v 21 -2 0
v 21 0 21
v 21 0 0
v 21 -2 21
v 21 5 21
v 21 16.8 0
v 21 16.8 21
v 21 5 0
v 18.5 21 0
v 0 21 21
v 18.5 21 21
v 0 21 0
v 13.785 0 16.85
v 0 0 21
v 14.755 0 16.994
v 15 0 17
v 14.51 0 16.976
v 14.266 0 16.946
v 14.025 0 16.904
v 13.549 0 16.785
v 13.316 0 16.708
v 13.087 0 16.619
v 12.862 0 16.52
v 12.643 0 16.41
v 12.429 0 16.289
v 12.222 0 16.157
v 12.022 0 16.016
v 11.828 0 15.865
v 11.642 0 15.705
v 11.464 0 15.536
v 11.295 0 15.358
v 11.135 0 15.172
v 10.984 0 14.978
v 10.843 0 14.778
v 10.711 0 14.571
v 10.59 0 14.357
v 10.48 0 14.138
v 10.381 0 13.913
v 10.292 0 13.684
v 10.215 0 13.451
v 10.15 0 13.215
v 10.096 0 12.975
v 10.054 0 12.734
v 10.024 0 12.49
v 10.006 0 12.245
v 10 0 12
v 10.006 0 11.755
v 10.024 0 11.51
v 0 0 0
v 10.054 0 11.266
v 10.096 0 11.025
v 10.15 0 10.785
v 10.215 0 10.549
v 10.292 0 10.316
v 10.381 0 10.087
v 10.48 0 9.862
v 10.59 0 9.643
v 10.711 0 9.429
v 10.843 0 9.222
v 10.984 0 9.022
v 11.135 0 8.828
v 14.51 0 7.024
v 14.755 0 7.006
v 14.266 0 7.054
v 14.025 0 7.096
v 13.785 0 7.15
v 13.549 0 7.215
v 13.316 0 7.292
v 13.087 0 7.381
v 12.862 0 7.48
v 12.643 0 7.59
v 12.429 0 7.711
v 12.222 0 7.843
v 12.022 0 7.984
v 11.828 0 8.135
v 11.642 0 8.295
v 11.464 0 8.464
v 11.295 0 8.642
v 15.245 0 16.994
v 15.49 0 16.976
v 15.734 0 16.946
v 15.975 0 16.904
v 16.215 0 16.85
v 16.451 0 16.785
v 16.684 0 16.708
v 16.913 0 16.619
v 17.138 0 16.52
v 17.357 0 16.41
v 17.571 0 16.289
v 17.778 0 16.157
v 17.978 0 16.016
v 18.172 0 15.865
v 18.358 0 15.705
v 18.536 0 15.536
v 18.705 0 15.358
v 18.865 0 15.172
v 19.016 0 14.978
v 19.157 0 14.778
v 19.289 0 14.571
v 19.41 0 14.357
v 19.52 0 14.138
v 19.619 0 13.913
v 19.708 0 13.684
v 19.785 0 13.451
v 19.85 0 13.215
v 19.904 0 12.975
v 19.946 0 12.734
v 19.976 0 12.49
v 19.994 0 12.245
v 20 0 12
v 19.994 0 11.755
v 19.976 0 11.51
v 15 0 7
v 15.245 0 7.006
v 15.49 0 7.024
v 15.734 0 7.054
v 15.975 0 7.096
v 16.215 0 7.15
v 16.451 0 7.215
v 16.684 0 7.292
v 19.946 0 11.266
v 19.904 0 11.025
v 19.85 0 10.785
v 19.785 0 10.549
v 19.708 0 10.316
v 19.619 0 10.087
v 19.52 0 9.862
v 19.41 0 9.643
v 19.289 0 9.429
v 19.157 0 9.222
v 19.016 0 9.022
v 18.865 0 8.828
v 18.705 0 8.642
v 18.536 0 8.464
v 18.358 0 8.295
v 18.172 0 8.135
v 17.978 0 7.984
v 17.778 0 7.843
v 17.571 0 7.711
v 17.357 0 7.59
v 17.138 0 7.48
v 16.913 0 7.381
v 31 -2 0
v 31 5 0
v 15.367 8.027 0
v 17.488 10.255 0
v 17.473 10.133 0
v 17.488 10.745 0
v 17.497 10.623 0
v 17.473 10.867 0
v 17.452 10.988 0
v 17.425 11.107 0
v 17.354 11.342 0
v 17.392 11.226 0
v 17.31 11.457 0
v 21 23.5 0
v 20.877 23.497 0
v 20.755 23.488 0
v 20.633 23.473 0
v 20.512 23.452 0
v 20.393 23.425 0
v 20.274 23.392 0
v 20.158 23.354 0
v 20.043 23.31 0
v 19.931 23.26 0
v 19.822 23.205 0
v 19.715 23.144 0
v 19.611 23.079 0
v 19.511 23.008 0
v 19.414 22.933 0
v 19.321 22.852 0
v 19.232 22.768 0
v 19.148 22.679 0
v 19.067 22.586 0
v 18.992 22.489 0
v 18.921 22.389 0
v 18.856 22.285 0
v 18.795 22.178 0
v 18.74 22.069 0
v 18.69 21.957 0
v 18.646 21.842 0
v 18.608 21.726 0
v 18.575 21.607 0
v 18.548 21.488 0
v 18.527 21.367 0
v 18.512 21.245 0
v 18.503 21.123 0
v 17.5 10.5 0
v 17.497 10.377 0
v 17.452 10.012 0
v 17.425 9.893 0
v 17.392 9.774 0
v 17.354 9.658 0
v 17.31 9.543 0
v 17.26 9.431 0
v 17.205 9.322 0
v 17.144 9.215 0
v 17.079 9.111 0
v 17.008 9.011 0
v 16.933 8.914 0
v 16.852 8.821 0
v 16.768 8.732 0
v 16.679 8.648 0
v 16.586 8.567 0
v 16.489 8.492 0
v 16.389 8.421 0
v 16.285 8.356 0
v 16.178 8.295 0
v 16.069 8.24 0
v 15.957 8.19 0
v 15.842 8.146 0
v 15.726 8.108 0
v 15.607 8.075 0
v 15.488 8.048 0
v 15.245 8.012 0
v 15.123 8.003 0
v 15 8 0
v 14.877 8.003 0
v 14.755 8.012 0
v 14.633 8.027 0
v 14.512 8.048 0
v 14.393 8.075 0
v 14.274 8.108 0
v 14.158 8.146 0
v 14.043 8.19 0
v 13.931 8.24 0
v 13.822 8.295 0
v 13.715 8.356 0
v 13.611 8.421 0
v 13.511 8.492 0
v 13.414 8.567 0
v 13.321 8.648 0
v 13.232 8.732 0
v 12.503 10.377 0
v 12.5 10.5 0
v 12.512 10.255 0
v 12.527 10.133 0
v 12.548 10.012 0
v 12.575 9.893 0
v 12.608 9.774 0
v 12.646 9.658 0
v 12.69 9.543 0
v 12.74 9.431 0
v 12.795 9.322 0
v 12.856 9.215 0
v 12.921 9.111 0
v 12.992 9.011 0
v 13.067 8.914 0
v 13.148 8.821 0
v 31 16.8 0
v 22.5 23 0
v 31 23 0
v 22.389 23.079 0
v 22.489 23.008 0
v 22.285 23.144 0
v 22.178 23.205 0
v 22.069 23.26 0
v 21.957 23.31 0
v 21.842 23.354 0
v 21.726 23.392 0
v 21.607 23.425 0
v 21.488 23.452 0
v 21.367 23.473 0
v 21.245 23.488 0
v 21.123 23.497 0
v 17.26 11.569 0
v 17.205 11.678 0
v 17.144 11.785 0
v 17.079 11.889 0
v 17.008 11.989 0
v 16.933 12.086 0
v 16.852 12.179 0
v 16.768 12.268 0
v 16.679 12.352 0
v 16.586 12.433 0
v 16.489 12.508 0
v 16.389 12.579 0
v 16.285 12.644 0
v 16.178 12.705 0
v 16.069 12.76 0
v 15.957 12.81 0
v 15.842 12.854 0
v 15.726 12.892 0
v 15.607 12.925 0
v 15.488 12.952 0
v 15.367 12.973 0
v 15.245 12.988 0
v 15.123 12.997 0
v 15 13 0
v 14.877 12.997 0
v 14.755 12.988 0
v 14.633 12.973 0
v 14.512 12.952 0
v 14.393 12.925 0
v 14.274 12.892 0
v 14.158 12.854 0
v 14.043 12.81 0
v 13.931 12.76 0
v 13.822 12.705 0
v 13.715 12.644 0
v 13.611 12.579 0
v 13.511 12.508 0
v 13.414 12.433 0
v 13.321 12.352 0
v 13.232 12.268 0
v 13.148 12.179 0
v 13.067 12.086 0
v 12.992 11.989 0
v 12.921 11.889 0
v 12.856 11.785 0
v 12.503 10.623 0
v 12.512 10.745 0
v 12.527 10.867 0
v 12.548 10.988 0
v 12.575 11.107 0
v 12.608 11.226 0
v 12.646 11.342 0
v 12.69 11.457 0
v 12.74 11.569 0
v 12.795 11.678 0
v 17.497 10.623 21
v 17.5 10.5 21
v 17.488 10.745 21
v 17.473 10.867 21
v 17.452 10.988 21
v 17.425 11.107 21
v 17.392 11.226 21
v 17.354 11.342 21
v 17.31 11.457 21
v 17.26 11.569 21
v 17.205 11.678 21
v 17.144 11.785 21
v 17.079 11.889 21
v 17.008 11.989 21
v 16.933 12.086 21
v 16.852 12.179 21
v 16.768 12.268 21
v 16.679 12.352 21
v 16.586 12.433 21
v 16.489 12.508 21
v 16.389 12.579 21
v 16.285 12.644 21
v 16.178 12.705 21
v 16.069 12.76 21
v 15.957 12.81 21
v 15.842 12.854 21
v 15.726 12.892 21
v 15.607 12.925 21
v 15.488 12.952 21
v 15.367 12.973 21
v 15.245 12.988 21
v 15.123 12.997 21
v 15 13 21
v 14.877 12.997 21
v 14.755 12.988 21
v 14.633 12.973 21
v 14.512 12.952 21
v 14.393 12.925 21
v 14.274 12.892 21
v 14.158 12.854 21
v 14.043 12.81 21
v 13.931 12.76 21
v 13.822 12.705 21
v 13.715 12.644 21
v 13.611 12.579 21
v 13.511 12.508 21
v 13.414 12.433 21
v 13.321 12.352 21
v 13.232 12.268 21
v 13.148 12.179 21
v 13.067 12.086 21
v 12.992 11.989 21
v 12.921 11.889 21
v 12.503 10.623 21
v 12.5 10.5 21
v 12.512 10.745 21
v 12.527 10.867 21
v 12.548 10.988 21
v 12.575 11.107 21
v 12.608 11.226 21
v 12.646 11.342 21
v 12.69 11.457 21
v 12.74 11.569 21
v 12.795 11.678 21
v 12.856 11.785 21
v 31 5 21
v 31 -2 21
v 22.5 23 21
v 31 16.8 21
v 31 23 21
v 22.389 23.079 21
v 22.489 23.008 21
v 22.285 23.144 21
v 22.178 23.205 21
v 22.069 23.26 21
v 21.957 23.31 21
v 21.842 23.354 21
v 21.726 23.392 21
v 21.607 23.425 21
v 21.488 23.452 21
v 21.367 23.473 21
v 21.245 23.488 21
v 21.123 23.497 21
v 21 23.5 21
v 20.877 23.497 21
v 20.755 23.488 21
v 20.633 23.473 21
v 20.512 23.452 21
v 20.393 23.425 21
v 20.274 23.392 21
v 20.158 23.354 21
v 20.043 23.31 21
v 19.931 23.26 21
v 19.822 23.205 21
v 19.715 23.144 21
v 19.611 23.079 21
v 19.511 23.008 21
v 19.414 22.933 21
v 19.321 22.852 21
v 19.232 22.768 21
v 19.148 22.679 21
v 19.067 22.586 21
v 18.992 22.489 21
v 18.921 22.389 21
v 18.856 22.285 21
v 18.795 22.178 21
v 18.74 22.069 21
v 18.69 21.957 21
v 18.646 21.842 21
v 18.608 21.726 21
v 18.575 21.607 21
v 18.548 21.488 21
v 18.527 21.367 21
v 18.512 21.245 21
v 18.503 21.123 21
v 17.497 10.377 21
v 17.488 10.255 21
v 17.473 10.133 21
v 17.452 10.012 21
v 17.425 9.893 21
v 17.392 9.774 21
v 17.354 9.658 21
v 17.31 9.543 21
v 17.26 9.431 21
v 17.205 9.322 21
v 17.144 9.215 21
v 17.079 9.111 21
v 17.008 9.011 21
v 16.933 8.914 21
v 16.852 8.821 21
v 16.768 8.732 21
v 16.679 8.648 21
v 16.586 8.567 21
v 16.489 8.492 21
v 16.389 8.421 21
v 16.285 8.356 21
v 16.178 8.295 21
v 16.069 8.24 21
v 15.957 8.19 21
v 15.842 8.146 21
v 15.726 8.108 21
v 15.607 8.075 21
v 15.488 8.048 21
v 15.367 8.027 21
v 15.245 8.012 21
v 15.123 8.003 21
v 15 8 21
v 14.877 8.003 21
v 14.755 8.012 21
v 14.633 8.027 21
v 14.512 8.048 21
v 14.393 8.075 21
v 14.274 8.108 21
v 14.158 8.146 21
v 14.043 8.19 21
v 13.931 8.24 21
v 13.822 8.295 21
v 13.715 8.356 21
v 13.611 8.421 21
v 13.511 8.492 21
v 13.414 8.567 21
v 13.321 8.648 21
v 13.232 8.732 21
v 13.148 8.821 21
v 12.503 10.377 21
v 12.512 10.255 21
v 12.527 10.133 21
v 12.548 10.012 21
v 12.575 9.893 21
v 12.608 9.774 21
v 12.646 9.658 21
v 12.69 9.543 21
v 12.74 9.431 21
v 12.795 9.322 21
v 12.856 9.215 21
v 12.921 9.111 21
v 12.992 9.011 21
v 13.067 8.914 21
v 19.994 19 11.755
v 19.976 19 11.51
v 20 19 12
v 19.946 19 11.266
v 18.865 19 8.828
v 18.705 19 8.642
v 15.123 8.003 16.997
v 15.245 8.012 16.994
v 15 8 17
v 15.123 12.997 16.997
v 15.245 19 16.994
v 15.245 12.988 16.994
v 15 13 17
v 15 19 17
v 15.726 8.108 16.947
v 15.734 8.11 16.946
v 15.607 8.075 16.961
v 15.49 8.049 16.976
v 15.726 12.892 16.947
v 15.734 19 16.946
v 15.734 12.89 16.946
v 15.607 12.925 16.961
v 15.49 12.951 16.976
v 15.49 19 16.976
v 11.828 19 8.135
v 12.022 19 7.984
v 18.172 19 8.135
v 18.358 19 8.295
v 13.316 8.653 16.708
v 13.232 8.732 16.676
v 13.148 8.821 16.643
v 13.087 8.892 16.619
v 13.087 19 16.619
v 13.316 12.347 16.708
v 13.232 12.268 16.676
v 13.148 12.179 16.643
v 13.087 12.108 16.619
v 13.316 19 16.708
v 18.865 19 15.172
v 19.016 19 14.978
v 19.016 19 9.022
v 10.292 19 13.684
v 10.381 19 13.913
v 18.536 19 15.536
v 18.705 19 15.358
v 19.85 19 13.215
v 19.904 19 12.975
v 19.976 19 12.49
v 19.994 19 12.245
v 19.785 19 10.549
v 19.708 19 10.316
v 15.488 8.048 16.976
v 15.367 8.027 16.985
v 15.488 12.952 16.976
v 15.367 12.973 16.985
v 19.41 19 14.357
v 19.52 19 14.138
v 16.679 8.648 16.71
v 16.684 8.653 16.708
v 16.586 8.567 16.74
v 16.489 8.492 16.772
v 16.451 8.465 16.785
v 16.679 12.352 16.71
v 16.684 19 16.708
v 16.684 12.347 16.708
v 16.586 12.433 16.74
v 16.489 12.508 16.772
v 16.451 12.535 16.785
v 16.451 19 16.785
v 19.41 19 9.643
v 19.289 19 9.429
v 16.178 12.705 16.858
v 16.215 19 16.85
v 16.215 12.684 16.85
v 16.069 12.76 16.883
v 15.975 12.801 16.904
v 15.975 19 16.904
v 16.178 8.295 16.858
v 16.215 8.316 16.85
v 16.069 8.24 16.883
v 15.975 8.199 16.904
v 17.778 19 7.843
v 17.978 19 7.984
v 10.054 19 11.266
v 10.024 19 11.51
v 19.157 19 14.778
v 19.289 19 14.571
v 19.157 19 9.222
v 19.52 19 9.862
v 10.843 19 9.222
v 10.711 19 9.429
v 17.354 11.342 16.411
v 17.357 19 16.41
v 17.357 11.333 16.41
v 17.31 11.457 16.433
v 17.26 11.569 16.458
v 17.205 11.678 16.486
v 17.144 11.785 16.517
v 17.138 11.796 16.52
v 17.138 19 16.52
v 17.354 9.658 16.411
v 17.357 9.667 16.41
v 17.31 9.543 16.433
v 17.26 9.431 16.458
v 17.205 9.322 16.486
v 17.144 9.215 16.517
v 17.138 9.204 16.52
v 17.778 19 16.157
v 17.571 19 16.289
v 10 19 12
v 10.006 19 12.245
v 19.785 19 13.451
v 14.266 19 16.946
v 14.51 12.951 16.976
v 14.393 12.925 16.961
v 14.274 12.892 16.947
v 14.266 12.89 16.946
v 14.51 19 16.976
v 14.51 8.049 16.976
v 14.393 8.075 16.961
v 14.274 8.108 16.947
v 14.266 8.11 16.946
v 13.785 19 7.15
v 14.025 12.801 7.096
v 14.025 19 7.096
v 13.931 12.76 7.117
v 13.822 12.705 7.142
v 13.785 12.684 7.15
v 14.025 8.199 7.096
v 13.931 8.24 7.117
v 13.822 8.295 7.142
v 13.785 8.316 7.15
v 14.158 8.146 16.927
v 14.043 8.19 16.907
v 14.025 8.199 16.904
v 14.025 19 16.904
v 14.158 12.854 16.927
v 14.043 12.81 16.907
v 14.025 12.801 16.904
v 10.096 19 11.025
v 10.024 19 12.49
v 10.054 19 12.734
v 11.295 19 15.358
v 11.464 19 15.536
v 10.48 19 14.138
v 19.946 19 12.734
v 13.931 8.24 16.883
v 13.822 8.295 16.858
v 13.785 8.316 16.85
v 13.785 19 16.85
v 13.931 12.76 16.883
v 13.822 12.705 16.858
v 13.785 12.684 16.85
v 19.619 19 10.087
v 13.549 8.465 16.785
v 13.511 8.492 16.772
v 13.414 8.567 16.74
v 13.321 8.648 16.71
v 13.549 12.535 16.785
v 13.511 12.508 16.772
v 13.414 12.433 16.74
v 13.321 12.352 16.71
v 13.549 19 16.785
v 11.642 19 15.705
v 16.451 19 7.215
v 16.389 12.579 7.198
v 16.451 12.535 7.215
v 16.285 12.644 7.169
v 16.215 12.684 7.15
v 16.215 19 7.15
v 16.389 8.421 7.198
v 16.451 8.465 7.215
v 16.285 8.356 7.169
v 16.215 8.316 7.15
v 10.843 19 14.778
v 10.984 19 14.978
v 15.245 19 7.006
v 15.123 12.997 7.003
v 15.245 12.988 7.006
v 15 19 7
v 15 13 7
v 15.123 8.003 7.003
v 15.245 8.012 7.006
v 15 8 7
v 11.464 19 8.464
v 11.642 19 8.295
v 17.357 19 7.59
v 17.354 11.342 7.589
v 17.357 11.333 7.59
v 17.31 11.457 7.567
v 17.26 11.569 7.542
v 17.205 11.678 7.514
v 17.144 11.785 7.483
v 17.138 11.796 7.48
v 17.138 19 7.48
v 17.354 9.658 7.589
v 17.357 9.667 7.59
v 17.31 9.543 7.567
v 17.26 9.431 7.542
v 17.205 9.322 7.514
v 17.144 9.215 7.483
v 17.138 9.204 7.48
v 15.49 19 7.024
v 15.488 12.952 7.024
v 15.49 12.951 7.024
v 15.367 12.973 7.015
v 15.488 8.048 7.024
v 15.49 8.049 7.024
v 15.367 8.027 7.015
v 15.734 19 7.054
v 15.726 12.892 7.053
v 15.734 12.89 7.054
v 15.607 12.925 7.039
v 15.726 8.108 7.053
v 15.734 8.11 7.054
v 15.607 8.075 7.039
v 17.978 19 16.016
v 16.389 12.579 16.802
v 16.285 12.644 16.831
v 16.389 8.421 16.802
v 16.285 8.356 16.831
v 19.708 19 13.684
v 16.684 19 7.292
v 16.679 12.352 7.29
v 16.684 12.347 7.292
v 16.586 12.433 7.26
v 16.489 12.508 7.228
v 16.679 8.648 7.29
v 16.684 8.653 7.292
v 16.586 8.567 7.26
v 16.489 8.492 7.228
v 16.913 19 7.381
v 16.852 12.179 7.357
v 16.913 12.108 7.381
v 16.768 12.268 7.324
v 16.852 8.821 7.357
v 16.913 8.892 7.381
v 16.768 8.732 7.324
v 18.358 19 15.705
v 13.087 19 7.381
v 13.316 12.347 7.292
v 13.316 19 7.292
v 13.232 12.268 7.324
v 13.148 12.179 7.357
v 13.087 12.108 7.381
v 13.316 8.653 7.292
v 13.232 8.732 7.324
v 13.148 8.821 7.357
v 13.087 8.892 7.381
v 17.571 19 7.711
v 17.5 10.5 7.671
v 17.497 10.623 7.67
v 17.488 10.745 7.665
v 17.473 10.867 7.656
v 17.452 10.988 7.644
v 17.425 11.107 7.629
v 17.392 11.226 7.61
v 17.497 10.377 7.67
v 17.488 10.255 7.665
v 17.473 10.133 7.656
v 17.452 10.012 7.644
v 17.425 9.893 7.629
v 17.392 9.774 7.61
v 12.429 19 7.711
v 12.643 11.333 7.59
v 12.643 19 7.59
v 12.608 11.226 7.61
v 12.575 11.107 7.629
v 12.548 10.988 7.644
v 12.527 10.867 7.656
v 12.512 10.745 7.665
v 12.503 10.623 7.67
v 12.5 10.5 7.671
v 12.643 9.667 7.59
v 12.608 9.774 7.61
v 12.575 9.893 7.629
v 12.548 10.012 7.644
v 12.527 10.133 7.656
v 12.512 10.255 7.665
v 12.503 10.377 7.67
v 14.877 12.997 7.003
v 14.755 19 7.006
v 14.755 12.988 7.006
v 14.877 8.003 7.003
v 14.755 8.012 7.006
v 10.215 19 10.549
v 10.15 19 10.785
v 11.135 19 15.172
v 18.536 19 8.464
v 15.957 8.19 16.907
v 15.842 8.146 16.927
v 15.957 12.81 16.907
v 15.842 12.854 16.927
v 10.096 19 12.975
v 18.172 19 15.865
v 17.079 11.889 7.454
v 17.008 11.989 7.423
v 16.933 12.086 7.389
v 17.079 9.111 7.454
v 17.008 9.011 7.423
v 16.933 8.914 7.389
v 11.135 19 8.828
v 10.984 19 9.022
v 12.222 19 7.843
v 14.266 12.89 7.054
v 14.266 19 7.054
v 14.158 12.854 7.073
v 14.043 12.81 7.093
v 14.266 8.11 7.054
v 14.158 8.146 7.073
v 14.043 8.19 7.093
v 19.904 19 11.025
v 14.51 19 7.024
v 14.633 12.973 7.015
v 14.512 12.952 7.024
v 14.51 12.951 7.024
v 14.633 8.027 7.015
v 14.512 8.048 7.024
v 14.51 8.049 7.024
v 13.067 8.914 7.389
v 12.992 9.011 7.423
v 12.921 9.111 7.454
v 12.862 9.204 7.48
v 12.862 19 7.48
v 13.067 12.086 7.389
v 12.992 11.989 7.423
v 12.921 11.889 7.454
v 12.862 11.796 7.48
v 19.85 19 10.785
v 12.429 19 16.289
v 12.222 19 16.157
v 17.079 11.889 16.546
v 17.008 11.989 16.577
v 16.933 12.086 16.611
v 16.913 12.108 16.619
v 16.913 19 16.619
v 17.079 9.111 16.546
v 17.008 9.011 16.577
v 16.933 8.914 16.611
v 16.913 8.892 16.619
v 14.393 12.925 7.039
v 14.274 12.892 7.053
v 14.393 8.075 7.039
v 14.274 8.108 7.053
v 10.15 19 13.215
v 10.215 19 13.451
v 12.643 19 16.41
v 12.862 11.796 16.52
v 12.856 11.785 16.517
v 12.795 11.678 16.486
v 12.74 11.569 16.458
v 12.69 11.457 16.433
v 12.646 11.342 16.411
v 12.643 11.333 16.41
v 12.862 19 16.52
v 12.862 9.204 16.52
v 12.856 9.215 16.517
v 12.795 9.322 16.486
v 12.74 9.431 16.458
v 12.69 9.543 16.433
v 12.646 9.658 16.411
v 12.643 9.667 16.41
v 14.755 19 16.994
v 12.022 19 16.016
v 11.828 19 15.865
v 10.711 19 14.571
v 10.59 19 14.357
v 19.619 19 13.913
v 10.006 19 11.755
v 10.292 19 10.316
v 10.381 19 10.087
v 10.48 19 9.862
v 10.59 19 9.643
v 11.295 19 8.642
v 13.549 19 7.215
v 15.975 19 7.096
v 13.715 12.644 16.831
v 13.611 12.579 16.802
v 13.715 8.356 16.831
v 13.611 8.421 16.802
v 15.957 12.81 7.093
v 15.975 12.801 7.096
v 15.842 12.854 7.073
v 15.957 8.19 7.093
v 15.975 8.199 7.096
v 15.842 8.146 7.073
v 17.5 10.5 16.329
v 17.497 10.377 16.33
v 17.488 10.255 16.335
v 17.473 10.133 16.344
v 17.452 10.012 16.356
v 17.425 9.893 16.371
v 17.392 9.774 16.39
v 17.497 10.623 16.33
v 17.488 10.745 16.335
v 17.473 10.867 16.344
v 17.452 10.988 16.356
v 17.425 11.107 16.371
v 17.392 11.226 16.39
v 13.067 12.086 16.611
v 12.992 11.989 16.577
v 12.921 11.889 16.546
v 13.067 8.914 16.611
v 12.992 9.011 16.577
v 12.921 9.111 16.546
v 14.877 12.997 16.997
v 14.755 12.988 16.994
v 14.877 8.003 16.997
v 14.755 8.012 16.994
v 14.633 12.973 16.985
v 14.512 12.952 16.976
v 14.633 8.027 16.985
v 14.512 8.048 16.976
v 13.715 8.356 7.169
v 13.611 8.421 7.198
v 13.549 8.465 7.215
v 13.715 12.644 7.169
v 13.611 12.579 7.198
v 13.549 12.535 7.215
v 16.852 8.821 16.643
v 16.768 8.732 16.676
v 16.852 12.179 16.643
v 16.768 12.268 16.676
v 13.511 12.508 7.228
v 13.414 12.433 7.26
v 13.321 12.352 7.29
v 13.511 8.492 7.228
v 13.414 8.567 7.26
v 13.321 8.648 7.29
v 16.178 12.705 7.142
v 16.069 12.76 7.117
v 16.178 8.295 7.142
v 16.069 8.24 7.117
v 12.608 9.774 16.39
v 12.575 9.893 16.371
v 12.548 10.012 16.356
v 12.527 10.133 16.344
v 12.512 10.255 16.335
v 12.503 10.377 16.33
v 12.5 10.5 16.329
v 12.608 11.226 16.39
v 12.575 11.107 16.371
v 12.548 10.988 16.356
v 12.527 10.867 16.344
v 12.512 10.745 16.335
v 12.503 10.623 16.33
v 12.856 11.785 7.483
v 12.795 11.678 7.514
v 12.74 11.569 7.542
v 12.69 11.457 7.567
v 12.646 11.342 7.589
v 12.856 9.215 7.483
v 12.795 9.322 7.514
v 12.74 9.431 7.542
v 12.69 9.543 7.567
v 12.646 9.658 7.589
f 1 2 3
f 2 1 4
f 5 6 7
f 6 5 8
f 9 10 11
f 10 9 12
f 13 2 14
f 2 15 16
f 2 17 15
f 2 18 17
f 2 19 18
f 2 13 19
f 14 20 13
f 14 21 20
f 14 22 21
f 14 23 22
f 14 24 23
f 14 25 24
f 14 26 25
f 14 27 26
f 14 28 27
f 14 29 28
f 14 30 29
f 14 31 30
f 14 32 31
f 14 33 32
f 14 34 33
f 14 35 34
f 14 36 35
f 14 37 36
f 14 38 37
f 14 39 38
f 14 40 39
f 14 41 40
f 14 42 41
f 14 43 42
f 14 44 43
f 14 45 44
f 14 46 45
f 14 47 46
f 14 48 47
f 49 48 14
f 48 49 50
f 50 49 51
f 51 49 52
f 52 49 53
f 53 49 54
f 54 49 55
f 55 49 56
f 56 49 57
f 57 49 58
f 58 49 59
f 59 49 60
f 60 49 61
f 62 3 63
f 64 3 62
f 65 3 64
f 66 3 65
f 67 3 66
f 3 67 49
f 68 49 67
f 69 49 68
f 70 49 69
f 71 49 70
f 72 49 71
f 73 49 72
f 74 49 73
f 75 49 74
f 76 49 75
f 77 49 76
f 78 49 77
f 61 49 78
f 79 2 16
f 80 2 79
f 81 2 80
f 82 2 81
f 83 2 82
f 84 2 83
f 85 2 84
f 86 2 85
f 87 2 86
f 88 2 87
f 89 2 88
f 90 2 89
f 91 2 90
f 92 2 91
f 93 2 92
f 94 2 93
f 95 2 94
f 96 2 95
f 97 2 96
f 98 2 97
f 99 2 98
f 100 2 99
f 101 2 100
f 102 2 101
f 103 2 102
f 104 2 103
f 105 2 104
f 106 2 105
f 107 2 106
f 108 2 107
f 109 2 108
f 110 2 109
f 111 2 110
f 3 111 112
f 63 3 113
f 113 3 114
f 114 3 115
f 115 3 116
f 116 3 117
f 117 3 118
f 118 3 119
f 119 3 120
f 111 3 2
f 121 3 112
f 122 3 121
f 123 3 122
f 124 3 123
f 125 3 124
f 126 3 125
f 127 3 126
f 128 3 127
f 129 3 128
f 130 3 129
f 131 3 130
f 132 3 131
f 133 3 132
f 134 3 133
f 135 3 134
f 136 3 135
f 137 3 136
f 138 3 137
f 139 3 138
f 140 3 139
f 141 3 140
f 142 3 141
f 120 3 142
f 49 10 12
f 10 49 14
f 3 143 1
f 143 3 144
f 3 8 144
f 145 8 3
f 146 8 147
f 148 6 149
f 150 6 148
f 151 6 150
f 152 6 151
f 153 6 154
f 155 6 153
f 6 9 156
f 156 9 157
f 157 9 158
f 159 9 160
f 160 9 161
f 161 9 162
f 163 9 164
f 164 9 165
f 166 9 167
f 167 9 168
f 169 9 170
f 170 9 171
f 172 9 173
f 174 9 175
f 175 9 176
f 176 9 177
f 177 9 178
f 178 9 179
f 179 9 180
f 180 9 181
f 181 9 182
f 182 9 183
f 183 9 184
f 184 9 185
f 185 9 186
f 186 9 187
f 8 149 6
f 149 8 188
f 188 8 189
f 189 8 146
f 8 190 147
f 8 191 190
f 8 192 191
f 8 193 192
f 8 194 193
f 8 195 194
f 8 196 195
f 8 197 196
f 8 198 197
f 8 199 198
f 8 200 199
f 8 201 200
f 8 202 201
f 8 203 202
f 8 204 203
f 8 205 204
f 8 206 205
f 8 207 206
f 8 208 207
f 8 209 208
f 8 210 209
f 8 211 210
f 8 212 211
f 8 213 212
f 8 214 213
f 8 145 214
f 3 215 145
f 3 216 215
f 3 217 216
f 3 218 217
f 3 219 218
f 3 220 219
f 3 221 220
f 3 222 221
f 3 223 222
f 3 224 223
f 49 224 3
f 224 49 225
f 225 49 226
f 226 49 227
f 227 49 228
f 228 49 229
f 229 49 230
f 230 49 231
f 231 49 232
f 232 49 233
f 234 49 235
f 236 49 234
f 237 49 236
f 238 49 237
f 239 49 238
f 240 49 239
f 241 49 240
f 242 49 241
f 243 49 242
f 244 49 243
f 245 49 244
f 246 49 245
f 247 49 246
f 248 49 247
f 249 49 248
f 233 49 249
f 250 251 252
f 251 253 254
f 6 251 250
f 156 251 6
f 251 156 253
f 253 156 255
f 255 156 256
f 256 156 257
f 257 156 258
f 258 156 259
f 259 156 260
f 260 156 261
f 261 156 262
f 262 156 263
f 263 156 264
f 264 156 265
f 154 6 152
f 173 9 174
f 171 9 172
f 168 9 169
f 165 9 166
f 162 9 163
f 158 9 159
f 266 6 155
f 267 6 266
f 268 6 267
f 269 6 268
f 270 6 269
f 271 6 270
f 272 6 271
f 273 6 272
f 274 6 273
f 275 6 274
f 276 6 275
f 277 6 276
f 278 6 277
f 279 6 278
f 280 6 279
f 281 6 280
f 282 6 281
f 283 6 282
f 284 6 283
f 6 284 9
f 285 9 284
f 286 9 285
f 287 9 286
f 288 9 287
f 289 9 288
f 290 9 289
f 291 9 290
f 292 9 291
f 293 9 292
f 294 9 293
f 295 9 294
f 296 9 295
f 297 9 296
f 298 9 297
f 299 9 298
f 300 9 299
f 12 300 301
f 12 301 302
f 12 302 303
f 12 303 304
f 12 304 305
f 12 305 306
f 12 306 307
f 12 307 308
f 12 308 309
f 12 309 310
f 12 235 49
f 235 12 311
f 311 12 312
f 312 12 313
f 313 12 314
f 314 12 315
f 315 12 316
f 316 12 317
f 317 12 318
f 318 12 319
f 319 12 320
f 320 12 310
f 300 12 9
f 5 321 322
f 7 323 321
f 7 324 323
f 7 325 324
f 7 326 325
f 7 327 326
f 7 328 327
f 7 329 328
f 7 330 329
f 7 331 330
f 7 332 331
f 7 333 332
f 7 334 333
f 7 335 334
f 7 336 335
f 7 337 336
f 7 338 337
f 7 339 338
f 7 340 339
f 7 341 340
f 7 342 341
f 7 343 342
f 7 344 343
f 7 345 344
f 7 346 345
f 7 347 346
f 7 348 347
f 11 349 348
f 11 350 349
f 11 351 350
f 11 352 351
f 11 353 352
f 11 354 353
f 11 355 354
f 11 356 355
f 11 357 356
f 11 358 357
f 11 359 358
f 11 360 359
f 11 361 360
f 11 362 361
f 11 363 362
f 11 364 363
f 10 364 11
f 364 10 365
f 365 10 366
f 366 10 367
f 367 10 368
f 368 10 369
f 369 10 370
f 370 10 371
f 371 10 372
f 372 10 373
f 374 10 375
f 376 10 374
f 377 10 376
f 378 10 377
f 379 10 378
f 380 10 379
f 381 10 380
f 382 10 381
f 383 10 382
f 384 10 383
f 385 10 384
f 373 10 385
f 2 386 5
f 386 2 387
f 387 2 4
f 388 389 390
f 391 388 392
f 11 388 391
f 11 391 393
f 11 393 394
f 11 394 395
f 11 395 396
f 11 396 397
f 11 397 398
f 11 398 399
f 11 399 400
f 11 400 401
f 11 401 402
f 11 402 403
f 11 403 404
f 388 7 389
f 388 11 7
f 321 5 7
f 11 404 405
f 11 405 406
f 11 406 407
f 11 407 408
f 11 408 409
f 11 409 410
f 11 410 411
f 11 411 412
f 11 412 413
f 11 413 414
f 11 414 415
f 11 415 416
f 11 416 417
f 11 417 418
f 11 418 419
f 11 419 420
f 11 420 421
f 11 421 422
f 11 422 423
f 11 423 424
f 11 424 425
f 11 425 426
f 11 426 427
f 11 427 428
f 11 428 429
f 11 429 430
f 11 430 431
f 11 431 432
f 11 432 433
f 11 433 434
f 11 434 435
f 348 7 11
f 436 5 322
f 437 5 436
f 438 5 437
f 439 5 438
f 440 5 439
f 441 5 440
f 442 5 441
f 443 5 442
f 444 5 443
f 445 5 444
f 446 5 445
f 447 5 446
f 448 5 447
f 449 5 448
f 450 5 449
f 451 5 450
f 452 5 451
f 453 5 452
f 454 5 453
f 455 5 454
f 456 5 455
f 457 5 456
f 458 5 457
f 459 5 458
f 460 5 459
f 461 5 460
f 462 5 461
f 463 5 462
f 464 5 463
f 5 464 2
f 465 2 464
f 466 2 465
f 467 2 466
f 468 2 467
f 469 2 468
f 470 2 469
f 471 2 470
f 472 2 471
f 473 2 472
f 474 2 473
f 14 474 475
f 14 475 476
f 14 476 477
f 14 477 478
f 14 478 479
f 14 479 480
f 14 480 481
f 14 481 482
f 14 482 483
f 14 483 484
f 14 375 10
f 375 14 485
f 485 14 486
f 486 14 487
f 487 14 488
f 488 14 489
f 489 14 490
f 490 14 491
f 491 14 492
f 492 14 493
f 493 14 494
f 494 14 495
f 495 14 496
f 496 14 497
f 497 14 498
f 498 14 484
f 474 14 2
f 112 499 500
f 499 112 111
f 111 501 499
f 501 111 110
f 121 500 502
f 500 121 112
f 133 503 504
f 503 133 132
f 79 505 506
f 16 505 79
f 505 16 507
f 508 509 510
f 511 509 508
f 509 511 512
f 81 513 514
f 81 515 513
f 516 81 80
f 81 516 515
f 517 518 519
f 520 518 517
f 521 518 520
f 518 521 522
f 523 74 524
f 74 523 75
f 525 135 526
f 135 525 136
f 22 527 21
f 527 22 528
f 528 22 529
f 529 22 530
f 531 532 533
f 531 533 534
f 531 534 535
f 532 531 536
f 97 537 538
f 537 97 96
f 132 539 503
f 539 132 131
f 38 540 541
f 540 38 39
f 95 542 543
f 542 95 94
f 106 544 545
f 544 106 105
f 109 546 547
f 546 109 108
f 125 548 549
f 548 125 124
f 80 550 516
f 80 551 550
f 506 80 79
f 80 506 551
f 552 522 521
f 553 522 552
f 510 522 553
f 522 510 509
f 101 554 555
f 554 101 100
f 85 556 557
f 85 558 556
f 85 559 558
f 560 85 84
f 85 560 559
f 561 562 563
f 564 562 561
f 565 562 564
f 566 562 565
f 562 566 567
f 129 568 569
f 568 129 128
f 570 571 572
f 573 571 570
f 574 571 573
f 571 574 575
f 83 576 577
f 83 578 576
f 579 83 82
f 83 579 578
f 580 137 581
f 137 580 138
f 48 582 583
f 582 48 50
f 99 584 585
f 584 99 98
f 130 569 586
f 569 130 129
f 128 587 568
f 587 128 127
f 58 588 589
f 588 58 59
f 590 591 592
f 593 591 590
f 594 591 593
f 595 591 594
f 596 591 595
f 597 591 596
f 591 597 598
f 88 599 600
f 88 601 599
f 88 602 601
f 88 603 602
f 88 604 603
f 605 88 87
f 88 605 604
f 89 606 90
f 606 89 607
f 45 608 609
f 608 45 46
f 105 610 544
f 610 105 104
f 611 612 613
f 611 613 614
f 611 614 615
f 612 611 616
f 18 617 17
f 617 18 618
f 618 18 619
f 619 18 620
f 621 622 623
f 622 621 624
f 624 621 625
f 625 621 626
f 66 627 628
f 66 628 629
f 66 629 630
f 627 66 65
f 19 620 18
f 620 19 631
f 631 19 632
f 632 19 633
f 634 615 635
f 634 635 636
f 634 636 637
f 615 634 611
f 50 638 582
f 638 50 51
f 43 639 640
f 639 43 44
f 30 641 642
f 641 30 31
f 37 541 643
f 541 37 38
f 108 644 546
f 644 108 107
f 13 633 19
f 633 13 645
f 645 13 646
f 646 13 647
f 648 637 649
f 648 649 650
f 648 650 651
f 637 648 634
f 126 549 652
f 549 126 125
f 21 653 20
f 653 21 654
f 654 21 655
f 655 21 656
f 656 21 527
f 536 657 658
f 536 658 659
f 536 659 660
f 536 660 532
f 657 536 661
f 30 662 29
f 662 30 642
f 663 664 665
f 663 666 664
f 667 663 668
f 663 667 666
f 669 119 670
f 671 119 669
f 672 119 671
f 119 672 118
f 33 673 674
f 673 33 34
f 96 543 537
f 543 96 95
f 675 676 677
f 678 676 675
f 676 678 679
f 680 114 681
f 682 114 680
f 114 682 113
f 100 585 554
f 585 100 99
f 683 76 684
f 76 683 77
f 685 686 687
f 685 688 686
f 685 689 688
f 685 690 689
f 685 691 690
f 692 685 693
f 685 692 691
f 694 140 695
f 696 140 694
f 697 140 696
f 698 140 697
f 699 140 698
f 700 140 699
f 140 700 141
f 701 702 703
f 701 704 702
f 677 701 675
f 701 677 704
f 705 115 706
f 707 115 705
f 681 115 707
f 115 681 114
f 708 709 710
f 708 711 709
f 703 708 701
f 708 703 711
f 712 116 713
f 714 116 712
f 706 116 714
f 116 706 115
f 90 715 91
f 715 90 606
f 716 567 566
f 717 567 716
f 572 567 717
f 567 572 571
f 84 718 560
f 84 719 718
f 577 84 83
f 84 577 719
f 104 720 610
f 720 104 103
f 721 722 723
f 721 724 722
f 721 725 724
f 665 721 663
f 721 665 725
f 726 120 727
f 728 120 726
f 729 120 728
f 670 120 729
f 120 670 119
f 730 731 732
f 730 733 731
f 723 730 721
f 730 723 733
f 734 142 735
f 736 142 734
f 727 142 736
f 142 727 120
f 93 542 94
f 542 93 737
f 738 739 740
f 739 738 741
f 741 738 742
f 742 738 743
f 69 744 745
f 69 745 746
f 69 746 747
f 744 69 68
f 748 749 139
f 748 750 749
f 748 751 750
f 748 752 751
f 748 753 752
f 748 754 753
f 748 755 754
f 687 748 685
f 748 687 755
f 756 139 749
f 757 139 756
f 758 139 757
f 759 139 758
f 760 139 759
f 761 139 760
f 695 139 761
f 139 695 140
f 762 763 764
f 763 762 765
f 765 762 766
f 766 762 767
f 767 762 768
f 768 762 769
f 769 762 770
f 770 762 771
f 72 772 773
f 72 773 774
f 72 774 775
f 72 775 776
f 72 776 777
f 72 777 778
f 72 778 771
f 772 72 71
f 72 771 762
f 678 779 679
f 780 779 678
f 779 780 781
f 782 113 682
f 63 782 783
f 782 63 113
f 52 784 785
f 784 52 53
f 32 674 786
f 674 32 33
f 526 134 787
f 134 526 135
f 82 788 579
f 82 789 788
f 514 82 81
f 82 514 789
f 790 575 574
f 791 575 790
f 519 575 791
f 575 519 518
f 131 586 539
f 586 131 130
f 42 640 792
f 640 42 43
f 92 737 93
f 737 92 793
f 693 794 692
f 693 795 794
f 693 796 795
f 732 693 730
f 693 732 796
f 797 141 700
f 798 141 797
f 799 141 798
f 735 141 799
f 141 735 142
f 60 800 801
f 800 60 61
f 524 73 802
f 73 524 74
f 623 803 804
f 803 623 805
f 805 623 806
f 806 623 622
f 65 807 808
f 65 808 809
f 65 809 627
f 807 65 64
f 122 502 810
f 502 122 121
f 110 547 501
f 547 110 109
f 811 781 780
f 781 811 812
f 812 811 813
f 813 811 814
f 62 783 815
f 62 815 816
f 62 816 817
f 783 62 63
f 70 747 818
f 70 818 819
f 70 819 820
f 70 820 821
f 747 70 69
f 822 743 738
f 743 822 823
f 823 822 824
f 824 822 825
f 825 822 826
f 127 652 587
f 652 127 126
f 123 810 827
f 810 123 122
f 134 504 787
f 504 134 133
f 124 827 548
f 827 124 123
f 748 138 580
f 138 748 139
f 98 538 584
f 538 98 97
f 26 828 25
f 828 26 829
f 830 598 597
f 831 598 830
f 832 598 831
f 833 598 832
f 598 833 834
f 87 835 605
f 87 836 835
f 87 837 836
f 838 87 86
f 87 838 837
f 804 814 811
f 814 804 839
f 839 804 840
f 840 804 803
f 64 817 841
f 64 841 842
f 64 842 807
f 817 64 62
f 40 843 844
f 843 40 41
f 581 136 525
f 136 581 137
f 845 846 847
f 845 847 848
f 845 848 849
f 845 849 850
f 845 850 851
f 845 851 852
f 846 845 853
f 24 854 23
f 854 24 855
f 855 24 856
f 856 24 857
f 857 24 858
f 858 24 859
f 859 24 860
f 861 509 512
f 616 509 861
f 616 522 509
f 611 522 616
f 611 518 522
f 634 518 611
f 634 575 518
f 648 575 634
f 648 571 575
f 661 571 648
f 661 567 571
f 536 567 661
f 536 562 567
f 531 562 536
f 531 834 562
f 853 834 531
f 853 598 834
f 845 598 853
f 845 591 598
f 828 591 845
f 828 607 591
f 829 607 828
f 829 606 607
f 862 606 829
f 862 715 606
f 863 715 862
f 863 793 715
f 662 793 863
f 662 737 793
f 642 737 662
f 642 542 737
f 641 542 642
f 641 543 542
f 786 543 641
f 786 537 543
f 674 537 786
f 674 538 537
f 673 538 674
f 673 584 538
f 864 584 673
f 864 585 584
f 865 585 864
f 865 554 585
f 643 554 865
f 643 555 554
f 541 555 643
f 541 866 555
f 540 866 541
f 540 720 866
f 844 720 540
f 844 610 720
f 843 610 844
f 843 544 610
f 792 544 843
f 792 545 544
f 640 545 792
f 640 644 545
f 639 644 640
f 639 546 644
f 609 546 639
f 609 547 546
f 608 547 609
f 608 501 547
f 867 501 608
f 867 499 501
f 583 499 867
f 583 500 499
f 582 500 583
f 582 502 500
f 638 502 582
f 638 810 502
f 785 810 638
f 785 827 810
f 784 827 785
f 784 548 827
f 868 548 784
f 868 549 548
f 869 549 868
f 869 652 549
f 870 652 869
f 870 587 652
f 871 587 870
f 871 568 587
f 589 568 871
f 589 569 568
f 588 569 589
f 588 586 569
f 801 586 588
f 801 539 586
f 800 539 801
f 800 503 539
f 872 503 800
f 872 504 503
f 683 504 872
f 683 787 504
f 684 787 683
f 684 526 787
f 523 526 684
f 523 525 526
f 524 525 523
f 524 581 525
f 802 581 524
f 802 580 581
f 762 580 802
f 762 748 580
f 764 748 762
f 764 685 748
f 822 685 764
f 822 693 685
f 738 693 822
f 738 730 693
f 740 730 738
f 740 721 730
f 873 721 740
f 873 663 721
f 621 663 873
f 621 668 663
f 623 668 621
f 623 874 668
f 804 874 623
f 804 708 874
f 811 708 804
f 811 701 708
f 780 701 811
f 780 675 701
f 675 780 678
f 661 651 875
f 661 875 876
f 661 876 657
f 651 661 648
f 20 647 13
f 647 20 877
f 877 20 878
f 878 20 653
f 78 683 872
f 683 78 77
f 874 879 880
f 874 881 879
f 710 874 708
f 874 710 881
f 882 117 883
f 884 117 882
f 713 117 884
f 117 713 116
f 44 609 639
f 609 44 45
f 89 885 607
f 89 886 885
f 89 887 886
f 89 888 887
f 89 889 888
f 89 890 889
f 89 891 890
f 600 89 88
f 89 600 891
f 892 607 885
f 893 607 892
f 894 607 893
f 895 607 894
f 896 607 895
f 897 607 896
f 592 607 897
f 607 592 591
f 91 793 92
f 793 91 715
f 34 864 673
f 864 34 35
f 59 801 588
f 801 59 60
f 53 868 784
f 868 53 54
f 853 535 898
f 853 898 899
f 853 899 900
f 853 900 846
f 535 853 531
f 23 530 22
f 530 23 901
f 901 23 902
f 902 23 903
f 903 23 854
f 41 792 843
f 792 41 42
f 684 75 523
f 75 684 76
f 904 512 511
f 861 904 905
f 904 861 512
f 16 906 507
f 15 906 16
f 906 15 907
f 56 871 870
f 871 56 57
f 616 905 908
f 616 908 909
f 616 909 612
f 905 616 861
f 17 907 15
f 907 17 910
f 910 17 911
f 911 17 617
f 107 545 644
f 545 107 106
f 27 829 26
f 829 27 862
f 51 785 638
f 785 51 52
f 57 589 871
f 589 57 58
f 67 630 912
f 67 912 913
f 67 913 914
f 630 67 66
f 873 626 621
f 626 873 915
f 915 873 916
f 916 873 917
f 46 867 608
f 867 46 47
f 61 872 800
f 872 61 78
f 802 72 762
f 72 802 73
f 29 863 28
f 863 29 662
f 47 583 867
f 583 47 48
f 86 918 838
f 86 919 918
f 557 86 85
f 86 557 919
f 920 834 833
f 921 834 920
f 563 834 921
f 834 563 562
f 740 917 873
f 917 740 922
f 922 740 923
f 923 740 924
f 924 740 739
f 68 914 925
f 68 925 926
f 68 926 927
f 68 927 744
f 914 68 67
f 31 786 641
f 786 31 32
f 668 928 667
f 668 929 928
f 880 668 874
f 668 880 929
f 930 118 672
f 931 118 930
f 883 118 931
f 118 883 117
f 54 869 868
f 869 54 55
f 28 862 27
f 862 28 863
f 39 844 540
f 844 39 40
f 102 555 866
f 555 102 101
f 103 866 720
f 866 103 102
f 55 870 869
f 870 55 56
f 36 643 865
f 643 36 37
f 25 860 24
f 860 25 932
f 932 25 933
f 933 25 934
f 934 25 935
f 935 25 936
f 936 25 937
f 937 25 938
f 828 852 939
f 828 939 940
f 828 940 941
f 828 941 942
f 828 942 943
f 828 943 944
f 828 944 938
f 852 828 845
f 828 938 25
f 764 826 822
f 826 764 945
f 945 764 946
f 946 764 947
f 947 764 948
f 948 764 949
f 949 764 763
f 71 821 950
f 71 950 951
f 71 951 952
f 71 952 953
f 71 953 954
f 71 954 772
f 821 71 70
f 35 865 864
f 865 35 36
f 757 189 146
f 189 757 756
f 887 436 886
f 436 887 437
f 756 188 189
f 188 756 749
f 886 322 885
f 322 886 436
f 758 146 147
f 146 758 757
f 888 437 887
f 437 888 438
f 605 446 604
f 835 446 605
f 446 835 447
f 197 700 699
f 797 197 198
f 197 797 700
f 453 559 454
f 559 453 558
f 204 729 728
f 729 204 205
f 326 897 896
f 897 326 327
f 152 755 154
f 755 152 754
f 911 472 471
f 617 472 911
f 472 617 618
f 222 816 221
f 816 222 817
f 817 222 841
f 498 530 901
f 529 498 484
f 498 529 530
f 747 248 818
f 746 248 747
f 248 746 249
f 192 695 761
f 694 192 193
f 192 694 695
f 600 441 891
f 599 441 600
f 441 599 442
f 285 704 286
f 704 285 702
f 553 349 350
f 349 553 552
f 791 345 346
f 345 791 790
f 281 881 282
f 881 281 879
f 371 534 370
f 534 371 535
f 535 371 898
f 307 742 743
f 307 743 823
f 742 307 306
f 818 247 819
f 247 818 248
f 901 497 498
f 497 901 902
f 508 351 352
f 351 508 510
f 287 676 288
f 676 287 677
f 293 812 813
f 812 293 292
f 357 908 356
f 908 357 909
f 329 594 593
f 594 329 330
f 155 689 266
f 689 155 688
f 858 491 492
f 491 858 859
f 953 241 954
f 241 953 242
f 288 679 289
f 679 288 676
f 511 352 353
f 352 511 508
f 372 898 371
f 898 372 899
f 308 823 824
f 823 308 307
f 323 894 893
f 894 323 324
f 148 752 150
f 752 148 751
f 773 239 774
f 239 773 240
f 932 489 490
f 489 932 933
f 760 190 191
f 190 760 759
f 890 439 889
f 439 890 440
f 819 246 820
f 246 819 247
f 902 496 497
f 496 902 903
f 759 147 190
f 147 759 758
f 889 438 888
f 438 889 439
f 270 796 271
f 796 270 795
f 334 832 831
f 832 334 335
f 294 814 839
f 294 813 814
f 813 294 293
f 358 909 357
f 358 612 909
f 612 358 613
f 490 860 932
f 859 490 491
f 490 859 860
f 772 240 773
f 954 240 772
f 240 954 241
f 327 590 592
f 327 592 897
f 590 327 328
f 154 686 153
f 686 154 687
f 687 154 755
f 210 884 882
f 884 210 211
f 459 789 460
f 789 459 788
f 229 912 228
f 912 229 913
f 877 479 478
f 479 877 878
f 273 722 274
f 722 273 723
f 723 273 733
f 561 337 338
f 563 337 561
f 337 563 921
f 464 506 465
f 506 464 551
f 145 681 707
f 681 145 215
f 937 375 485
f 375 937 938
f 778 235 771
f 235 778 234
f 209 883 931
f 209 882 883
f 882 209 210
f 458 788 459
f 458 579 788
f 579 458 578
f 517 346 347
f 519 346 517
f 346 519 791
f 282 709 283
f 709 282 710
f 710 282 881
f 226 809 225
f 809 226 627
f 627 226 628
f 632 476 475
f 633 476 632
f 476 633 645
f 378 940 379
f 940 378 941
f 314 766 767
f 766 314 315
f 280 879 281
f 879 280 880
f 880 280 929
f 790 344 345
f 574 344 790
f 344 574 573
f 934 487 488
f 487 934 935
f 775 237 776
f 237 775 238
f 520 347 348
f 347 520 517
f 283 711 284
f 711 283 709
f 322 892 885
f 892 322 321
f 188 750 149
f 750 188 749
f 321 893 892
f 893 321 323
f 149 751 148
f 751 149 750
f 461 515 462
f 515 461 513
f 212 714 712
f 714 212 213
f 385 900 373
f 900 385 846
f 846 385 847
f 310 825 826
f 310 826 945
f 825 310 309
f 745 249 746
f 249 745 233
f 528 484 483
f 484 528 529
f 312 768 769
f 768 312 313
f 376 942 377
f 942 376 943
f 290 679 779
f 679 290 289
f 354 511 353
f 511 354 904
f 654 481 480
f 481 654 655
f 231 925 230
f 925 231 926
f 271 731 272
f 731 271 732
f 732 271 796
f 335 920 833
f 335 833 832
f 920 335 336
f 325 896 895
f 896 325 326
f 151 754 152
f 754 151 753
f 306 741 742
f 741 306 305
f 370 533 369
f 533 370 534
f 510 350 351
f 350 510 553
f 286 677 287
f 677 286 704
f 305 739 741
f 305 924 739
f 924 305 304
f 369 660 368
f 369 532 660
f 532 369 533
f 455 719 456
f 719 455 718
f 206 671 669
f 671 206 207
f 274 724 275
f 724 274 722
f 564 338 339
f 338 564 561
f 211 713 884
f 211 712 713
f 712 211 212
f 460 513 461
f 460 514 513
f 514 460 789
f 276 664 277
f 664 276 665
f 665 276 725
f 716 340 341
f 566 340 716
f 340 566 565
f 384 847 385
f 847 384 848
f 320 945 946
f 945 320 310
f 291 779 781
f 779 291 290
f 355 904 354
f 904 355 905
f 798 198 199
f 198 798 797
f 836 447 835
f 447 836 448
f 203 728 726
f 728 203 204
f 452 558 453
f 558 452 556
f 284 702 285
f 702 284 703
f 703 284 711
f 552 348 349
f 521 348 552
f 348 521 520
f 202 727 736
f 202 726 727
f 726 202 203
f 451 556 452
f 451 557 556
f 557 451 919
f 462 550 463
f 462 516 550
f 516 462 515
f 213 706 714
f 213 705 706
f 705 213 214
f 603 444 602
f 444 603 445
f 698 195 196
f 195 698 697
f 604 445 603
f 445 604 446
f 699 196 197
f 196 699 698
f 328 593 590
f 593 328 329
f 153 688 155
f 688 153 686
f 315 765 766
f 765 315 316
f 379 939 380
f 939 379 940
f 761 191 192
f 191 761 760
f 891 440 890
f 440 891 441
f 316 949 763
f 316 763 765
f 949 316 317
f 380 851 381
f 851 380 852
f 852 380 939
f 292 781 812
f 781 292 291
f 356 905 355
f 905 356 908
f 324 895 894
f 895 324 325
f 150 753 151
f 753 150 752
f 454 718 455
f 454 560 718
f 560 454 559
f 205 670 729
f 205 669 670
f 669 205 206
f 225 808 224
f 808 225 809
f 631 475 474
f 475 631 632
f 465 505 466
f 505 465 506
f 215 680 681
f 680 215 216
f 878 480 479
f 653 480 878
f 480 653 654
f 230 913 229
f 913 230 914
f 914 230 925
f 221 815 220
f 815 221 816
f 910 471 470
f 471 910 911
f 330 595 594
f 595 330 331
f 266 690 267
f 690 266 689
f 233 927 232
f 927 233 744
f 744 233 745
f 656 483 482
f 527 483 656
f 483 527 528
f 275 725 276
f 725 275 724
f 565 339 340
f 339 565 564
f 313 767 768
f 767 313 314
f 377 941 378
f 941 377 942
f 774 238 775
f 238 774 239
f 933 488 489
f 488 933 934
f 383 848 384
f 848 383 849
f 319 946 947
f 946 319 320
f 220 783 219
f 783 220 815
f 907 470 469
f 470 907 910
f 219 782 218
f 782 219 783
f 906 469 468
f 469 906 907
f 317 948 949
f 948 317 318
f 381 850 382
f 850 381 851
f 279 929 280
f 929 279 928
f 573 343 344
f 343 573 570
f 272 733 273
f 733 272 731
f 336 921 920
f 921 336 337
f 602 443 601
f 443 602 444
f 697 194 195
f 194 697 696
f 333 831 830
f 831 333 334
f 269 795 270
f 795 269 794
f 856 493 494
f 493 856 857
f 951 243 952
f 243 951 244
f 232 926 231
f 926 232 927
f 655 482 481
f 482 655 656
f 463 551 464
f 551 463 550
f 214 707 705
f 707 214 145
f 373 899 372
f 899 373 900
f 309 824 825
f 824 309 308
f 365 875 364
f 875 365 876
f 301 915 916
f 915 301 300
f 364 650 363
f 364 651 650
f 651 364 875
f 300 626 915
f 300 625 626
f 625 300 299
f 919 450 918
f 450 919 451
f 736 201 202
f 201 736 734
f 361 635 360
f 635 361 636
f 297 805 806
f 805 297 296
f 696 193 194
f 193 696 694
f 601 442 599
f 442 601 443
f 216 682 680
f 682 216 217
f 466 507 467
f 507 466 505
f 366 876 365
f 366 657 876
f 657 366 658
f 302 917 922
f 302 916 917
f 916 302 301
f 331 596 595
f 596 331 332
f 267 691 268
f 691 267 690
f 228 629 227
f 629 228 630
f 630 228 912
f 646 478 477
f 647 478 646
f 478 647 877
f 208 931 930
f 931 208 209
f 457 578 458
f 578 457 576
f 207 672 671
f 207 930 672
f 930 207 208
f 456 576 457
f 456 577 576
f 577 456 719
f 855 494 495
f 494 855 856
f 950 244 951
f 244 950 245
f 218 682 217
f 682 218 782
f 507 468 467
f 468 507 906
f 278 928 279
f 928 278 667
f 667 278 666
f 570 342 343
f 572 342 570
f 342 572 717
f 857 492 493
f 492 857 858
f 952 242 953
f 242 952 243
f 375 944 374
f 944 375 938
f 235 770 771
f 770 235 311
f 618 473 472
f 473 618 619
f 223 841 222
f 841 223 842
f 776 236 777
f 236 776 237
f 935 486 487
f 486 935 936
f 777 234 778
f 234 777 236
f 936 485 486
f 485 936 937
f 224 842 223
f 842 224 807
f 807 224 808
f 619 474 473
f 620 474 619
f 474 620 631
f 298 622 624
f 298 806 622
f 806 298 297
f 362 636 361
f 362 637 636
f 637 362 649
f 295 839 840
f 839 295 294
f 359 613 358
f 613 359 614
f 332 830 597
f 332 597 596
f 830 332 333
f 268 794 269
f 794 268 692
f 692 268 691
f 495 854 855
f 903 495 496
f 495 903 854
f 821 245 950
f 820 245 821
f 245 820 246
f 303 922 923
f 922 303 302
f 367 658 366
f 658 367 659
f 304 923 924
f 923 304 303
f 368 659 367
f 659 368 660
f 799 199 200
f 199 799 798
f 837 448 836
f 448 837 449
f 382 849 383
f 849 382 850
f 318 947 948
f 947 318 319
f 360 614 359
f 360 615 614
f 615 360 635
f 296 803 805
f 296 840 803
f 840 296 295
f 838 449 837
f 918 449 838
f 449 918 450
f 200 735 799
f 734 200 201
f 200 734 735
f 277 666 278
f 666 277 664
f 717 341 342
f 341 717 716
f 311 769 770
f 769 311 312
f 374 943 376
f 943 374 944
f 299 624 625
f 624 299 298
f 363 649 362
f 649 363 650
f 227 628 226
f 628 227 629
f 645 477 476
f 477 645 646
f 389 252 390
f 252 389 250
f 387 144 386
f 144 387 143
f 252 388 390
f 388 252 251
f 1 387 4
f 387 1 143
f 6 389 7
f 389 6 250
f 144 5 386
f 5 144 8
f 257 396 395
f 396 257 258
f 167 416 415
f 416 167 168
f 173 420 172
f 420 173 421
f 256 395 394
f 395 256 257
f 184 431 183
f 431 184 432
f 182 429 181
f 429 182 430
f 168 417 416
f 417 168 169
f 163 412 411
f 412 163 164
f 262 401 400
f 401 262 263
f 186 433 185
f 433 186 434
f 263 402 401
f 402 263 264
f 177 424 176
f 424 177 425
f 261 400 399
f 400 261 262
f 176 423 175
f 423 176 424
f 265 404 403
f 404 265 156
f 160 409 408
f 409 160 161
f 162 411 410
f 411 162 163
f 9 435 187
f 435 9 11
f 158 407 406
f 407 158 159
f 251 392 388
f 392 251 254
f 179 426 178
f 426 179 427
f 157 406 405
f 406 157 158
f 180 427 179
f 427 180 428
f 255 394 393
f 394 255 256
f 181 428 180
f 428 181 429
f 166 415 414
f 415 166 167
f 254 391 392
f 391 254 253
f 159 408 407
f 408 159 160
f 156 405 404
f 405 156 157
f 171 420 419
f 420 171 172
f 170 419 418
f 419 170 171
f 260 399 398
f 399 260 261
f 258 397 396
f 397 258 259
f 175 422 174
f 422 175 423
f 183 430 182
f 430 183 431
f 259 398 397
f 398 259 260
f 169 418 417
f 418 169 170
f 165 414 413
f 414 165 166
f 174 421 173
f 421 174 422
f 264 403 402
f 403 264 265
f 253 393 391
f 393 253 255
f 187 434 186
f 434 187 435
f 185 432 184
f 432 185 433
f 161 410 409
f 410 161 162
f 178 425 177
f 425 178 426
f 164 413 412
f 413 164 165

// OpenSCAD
$fn=128;
translate([0,0,21]) rotate([-90,0,0]) union() {
  difference() {
    difference() {
      cube([21,21,21]);
      translate([15,9,0]) cylinder(d=10,h=19);
    }
    translate([15,0,10.5]) rotate([-90,0,0]) cylinder(d=5,h=21);
  }
}
difference() {
  translate([21,-2,0]) cube([10,25, 21]);
  translate([21,5,0]) cube([10,11.8,21]);
}

//    translate([21,0,0]) difference() {
//    cylinder(h=21,d=5);
//    translate([-10,0,0]) cube([20,10,21]);
//    }

translate([21,21,0]) difference() {
  cylinder(h=21,d=5);
  translate([-10,-10,0]) cube([20,10,21]);
}



module static_nose() {
  translate([-7,11/2,0])cube([7,10,21]);

  translate([0,6,0]) difference() {
    cylinder(h=21,d=11);
    translate([-10,0,0]) cube([20,10,21]);
  }

  translate([0,15,0]) difference() {
    cylinder(h=21,d=11);
    translate([-10,-10,0]) cube([20,10,21]);
  }

  points = [
    [0,0,0], // 0
    [0,0,13], // 1
    [7,0,7], // 2
    [7,0,0], // 3

    [0,10,0], // 4
    [0,10,13], // 5
    [7,10,7], // 6
    [7,10,0], // 7


  ];

  faces = [
    [0,1,2,3], // front
    [4,5,6,7], // back
    [5,1,2,6],
    [2,6,7,3],
    [0,1,5,4],
    [0,3,7,4]


  ];
  difference() {
    difference() {
      translate([-13,11/2,0]) polyhedron(points=points,faces=faces);
      translate([-10,21/2,0]) cylinder(h=13,d=3);
    }
    translate([-13,9,0]) cube([3,3,13]);
  }
}

// dynamic nose
module dynamic_nose() {
  difference() {
    union() {
      translate([-9,0,0]) cube([9,3, 21]);
      translate([-9,18,0]) cube([9,3, 21]);
    }

    union() {
      translate([-5,21/2,21/2]) rotate([90,0,0]) cylinder(h=21,d=6, center=true);
      translate([-5,0,4]) rotate([90,0,0]) cylinder(h=15,d=3, center=true);
      translate([-5,0,21-4]) rotate([90,0,0]) cylinder(h=15,d=3, center=true);
      translate([-5,15,4]) rotate([90,0,0]) cylinder(h=15,d=2, center=true);
      translate([-5,15,21-4]) rotate([90,0,0]) cylinder(h=15,d=2, center=true);
    }
  }
}
